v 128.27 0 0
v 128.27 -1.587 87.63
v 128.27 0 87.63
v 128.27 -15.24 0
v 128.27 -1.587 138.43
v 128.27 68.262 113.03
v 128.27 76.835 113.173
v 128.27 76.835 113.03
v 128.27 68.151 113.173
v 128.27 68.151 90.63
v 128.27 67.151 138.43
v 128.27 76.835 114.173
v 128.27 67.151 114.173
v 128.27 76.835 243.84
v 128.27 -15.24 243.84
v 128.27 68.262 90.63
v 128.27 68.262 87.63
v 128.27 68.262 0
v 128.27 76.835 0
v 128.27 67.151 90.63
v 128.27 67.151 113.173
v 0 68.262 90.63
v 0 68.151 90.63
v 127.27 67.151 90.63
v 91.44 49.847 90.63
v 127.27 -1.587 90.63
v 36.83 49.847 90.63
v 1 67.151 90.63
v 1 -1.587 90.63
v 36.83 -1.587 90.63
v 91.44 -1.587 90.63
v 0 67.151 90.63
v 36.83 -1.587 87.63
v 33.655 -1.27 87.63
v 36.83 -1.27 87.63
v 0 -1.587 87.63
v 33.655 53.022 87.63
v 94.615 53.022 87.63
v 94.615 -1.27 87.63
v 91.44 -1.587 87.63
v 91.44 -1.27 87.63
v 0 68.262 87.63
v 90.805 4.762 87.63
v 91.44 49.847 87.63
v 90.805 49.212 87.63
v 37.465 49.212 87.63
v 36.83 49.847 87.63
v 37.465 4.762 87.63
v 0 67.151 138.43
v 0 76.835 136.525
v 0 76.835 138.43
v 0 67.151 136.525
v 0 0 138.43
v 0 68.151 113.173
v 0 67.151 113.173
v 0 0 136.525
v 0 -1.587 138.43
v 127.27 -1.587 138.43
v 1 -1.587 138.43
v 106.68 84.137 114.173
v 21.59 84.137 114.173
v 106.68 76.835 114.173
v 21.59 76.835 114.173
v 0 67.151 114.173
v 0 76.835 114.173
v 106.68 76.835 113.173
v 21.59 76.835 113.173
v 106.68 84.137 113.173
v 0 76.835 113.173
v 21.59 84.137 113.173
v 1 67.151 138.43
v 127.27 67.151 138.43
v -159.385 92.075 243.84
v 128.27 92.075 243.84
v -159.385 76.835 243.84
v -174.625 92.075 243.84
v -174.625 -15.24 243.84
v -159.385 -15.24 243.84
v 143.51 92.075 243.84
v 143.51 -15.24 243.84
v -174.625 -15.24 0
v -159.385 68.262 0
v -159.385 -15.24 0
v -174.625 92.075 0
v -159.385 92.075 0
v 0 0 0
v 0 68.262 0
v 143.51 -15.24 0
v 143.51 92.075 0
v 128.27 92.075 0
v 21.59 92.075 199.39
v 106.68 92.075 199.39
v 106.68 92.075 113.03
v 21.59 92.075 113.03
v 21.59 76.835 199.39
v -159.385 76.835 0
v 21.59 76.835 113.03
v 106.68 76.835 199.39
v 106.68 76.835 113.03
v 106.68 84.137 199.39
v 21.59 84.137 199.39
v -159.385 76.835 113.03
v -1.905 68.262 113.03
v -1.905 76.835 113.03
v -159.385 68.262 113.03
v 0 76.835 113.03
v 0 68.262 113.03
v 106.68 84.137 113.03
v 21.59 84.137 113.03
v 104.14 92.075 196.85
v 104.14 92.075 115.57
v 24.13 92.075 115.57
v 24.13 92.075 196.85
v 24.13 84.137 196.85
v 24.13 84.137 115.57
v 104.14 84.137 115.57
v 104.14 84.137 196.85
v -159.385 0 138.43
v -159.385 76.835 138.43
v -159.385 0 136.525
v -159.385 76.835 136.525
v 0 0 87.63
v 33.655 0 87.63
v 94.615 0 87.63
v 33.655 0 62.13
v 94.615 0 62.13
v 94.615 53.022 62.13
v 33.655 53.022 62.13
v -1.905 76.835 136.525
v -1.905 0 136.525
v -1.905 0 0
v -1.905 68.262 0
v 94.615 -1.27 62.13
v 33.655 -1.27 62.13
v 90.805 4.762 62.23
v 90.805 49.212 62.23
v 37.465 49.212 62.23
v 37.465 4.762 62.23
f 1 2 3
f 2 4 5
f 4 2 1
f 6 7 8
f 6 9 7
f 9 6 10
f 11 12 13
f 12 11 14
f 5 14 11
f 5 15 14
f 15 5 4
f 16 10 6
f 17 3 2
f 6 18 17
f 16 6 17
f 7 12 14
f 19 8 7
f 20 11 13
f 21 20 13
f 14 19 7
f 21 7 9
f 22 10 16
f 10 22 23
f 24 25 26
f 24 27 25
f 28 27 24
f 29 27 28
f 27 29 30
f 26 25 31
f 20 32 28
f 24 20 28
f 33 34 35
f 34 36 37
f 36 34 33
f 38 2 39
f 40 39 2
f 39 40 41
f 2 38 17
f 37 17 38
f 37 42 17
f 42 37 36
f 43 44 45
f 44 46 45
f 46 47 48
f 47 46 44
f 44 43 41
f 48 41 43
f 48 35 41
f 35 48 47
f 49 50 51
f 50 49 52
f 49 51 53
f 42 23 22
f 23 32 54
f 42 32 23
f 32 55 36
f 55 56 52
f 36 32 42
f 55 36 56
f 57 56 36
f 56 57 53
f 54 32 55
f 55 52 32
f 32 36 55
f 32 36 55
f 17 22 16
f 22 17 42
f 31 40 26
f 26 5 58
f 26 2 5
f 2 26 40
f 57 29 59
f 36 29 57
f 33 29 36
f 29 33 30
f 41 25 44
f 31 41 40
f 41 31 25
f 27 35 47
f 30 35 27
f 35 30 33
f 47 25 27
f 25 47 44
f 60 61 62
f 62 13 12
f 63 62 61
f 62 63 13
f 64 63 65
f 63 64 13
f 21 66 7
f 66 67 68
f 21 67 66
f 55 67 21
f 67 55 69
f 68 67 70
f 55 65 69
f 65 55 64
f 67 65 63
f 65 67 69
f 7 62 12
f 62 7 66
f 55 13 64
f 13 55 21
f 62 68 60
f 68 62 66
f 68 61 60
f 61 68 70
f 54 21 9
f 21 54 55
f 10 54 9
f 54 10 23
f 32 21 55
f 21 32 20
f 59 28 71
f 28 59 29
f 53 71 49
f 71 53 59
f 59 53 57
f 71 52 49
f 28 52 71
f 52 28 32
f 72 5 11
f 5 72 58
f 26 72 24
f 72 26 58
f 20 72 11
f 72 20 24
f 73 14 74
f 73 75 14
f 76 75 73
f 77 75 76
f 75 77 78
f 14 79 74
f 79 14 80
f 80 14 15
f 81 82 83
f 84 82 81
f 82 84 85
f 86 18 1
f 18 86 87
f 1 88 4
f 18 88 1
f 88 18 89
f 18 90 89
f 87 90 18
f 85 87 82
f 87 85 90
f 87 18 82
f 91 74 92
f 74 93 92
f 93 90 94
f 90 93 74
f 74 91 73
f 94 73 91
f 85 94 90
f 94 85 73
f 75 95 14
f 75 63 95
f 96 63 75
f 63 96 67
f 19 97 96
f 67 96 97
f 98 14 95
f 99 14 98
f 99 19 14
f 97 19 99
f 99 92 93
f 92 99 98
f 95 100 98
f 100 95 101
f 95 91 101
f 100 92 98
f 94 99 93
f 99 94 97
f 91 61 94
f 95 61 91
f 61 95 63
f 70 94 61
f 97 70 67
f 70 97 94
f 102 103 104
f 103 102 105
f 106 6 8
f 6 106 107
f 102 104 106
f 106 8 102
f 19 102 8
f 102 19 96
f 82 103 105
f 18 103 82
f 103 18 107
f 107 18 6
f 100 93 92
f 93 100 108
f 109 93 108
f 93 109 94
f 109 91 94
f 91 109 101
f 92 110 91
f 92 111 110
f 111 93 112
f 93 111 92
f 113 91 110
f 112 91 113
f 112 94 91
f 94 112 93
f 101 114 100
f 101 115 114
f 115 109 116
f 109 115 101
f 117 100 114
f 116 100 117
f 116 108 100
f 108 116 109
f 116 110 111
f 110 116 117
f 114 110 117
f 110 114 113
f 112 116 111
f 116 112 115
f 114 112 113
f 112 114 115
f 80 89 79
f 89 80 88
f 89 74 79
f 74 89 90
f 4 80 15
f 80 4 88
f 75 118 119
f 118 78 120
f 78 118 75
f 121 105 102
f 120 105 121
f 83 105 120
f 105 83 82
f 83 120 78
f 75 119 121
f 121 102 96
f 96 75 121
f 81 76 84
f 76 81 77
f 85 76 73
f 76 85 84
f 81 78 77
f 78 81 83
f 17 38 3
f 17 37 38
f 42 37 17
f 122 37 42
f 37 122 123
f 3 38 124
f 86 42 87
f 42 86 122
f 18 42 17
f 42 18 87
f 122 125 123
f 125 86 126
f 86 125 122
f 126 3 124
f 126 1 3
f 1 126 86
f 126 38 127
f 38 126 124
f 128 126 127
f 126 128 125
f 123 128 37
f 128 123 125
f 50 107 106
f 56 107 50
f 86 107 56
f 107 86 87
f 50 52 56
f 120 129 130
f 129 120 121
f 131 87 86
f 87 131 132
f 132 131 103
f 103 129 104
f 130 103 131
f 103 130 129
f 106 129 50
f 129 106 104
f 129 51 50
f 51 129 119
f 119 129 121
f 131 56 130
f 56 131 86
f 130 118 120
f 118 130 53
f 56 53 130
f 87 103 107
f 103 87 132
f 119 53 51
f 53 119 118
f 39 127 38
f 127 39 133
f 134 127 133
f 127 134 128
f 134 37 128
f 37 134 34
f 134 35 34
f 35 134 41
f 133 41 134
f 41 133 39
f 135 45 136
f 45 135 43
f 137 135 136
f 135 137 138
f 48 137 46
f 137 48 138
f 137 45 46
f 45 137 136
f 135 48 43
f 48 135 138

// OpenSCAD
function mm(x) = x/10;
function cm(x) = x;
function in(x) = x*2.54;
function ft(x,i=0) = in(x*12+i);

epsilon = mm(1);
explode_gap = mm(0);

thin = cm(1);
thick = cm(3);
adhesive_thickness = in(7/16) - cm(1);

counter_width = in(50+1/2);
counter_depth = in(27+1/2);
counter_thickness = thick;
basin_cutout_depth = in(20+1/4);
basin_cutout_width = in(21+1/2);
basin_cutout_offset = in(14+1/2);

sill_width = in(50+1/2);
sill_depth = in(3+13/16);
sill_window_width = in(33+1/2);
sill_window_offset = in(8+1/2);
sill_window_depth = in(6+11/16);
sill_thickness = thin;

backsplash_height = in(8+7/8);
backsplash_width = in(50+1/2);
backsplash_thickness = thin;

sidesplash_height = in(20) - counter_thickness; //in(8+7/8);
sidesplash_depth = in(27+1/16);
sidesplash_thickness = thin;

shelf_width = in(62+3/4);
shelf_depth = in(30+1/4);
shelf_thickness = in(3/4);

partition_thickness = in(3/4);
partition_height = in(53+3/4);
partition_depth = in(30+1/4);
partition_cutout_depth = in(3+3/8);
partition_cutout_height = in(44+1/2);

machine_depth = in(34);
machine_height = in(53.5);
machine_width = in(27);


module counter() {
    difference() {
        cube([counter_width,counter_depth,counter_thickness]);
        translate([basin_cutout_offset, -epsilon, -epsilon]) {
            cube([basin_cutout_width, basin_cutout_depth + epsilon, counter_thickness + 2*epsilon]);
        }
    }
}
module sill() {
    union() {
        cube([sill_width,sill_depth,sill_thickness]);
        translate([sill_window_offset, 0, 0]) {
            cube([sill_window_width,sill_window_depth,sill_thickness]);
        }
    }
}
module backsplash() {
    cube([backsplash_width,backsplash_thickness,backsplash_height]);
}
module sidesplash() {
    cube([sidesplash_thickness,sidesplash_depth,sidesplash_height]);
}

color("gray") {
    translate([-explode_gap, cabinet_depth - counter_depth - explode_gap, cabinet_height + explode_gap]) {
        counter();
        translate([0, 0, counter_thickness + explode_gap]) {
            translate([0, counter_depth - adhesive_thickness - backsplash_thickness, 0]) {
                backsplash();
                translate([0, 0, backsplash_height + explode_gap]) {
                    sill();
                }
            }
            translate([0, -explode_gap, 0]) {
                sidesplash();
            }
            translate([counter_width - sidesplash_thickness, -explode_gap, 0]) {
                sidesplash();
            }
        }
    }
}

cabinet_width = in(50+1/2);
cabinet_depth = in(26+7/8);
cabinet_height = in(34+1/2);
cabinet_to_sill = in(10);
window_to_side = in(8+1/2);
window_width = in(33+1/2);
window_height = in(34);
sill_to_window = in(6+1/4);
sill_to_upperwall = in(3+3/8);
wall_thickness = in(6);
wall_height = ft(8);
sidewall_to_sidewall = in(113+1/4);

basin_to_back = in(7+1/2);
basin_width = in(21);
basin_to_side = in(14+3/4);
basin_depth = in(10);
basin_front_to_back = in(17.5);

sink_width = in(24);
sink_height = basin_depth + epsilon;
sink_overhang = in(1/2);
sink_depth = cabinet_depth + sink_overhang - basin_to_back + in(1+1/2);

module sink() {
    difference() {
        cube([sink_width, sink_depth, sink_height]);
        translate([(sink_width - basin_width) / 2, sink_depth - in(1+1/2) - basin_front_to_back, sink_height - basin_depth]) {
            cube([basin_width, basin_front_to_back, basin_depth + epsilon]);
        }
    }
}
module cabinet() {
    difference() {
        cube([cabinet_width, cabinet_depth, cabinet_height]);
        translate([cabinet_width - basin_to_side - basin_width - (sink_width - basin_width) / 2, -epsilon, cabinet_height - sink_height]) {
            cube([sink_width, sink_depth - sink_overhang + epsilon, sink_height + epsilon]);
        }
    }
}
module partition() {
    difference() {
        cube([partition_thickness, partition_depth, partition_height]);
        translate([-epsilon, partition_depth - partition_cutout_depth, -epsilon]) {
            cube([partition_thickness + 2*epsilon, partition_cutout_depth + epsilon, partition_cutout_height + epsilon]);
        }
    }
}
module shelf() {
    cube([shelf_width, shelf_depth, shelf_thickness]);
}
module sillwall() {
    cube([sidewall_to_sidewall, sill_to_upperwall, cabinet_height + cabinet_to_sill]);
}
module window() {
    window_thickness = wall_thickness - (sill_to_window - sill_to_upperwall);
    difference() {
        cube([window_width, window_thickness, window_height]);
        translate([in(1), -epsilon, in(1)]) {
            cube([window_width - in(2), window_thickness + 2*epsilon, window_height - in(2)]);
        }
    }
}
module window_opening() {
    cube([window_width, wall_thickness + 2*epsilon, window_height]);
}
module backwall() {
    difference() {
        cube([sidewall_to_sidewall, wall_thickness, wall_height]);
        translate([sidewall_to_sidewall - window_to_side - window_width, -epsilon, cabinet_height + cabinet_to_sill]) {
            window_opening();
        }
    }
}
module sidewall() {
    cube([wall_thickness, cabinet_depth + sill_to_upperwall + 2 * wall_thickness, wall_height]);
}
module walls() {
    union() {
        translate([-shelf_width - explode_gap, cabinet_depth, 0]) {
            sillwall();
            translate([0, sill_to_upperwall, 0]) {
                backwall();
            }
        }
        translate([cabinet_width - window_to_side - window_width - explode_gap, cabinet_depth + sill_to_window, cabinet_height + cabinet_to_sill]) {
            window();
        }
        translate([cabinet_width, -wall_thickness, 0]) {
            sidewall();
        }
        translate([-shelf_width - wall_thickness - 3 * explode_gap, -wall_thickness, 0]) {
            sidewall();
        }
    }
}

lightwalnut = [0.397, 0.315, 0.228];

color("lightgray") {
    walls();
}
translate([-explode_gap, -explode_gap, 0]) {
    color(lightwalnut) {
        cabinet();
        translate([-explode_gap - partition_thickness, cabinet_depth + sill_to_upperwall - partition_depth - explode_gap, explode_gap]) {
            partition();
        }
        translate([-explode_gap - shelf_width, cabinet_depth + sill_to_upperwall - shelf_depth - explode_gap, partition_height + 2*explode_gap]) {
            shelf();
        }
    }
    color("silver") {
        translate([cabinet_width - basin_to_side - basin_width - (sink_width - basin_width) / 2, -sink_overhang, cabinet_height - sink_height]) {
            sink();
        }
    }
}
